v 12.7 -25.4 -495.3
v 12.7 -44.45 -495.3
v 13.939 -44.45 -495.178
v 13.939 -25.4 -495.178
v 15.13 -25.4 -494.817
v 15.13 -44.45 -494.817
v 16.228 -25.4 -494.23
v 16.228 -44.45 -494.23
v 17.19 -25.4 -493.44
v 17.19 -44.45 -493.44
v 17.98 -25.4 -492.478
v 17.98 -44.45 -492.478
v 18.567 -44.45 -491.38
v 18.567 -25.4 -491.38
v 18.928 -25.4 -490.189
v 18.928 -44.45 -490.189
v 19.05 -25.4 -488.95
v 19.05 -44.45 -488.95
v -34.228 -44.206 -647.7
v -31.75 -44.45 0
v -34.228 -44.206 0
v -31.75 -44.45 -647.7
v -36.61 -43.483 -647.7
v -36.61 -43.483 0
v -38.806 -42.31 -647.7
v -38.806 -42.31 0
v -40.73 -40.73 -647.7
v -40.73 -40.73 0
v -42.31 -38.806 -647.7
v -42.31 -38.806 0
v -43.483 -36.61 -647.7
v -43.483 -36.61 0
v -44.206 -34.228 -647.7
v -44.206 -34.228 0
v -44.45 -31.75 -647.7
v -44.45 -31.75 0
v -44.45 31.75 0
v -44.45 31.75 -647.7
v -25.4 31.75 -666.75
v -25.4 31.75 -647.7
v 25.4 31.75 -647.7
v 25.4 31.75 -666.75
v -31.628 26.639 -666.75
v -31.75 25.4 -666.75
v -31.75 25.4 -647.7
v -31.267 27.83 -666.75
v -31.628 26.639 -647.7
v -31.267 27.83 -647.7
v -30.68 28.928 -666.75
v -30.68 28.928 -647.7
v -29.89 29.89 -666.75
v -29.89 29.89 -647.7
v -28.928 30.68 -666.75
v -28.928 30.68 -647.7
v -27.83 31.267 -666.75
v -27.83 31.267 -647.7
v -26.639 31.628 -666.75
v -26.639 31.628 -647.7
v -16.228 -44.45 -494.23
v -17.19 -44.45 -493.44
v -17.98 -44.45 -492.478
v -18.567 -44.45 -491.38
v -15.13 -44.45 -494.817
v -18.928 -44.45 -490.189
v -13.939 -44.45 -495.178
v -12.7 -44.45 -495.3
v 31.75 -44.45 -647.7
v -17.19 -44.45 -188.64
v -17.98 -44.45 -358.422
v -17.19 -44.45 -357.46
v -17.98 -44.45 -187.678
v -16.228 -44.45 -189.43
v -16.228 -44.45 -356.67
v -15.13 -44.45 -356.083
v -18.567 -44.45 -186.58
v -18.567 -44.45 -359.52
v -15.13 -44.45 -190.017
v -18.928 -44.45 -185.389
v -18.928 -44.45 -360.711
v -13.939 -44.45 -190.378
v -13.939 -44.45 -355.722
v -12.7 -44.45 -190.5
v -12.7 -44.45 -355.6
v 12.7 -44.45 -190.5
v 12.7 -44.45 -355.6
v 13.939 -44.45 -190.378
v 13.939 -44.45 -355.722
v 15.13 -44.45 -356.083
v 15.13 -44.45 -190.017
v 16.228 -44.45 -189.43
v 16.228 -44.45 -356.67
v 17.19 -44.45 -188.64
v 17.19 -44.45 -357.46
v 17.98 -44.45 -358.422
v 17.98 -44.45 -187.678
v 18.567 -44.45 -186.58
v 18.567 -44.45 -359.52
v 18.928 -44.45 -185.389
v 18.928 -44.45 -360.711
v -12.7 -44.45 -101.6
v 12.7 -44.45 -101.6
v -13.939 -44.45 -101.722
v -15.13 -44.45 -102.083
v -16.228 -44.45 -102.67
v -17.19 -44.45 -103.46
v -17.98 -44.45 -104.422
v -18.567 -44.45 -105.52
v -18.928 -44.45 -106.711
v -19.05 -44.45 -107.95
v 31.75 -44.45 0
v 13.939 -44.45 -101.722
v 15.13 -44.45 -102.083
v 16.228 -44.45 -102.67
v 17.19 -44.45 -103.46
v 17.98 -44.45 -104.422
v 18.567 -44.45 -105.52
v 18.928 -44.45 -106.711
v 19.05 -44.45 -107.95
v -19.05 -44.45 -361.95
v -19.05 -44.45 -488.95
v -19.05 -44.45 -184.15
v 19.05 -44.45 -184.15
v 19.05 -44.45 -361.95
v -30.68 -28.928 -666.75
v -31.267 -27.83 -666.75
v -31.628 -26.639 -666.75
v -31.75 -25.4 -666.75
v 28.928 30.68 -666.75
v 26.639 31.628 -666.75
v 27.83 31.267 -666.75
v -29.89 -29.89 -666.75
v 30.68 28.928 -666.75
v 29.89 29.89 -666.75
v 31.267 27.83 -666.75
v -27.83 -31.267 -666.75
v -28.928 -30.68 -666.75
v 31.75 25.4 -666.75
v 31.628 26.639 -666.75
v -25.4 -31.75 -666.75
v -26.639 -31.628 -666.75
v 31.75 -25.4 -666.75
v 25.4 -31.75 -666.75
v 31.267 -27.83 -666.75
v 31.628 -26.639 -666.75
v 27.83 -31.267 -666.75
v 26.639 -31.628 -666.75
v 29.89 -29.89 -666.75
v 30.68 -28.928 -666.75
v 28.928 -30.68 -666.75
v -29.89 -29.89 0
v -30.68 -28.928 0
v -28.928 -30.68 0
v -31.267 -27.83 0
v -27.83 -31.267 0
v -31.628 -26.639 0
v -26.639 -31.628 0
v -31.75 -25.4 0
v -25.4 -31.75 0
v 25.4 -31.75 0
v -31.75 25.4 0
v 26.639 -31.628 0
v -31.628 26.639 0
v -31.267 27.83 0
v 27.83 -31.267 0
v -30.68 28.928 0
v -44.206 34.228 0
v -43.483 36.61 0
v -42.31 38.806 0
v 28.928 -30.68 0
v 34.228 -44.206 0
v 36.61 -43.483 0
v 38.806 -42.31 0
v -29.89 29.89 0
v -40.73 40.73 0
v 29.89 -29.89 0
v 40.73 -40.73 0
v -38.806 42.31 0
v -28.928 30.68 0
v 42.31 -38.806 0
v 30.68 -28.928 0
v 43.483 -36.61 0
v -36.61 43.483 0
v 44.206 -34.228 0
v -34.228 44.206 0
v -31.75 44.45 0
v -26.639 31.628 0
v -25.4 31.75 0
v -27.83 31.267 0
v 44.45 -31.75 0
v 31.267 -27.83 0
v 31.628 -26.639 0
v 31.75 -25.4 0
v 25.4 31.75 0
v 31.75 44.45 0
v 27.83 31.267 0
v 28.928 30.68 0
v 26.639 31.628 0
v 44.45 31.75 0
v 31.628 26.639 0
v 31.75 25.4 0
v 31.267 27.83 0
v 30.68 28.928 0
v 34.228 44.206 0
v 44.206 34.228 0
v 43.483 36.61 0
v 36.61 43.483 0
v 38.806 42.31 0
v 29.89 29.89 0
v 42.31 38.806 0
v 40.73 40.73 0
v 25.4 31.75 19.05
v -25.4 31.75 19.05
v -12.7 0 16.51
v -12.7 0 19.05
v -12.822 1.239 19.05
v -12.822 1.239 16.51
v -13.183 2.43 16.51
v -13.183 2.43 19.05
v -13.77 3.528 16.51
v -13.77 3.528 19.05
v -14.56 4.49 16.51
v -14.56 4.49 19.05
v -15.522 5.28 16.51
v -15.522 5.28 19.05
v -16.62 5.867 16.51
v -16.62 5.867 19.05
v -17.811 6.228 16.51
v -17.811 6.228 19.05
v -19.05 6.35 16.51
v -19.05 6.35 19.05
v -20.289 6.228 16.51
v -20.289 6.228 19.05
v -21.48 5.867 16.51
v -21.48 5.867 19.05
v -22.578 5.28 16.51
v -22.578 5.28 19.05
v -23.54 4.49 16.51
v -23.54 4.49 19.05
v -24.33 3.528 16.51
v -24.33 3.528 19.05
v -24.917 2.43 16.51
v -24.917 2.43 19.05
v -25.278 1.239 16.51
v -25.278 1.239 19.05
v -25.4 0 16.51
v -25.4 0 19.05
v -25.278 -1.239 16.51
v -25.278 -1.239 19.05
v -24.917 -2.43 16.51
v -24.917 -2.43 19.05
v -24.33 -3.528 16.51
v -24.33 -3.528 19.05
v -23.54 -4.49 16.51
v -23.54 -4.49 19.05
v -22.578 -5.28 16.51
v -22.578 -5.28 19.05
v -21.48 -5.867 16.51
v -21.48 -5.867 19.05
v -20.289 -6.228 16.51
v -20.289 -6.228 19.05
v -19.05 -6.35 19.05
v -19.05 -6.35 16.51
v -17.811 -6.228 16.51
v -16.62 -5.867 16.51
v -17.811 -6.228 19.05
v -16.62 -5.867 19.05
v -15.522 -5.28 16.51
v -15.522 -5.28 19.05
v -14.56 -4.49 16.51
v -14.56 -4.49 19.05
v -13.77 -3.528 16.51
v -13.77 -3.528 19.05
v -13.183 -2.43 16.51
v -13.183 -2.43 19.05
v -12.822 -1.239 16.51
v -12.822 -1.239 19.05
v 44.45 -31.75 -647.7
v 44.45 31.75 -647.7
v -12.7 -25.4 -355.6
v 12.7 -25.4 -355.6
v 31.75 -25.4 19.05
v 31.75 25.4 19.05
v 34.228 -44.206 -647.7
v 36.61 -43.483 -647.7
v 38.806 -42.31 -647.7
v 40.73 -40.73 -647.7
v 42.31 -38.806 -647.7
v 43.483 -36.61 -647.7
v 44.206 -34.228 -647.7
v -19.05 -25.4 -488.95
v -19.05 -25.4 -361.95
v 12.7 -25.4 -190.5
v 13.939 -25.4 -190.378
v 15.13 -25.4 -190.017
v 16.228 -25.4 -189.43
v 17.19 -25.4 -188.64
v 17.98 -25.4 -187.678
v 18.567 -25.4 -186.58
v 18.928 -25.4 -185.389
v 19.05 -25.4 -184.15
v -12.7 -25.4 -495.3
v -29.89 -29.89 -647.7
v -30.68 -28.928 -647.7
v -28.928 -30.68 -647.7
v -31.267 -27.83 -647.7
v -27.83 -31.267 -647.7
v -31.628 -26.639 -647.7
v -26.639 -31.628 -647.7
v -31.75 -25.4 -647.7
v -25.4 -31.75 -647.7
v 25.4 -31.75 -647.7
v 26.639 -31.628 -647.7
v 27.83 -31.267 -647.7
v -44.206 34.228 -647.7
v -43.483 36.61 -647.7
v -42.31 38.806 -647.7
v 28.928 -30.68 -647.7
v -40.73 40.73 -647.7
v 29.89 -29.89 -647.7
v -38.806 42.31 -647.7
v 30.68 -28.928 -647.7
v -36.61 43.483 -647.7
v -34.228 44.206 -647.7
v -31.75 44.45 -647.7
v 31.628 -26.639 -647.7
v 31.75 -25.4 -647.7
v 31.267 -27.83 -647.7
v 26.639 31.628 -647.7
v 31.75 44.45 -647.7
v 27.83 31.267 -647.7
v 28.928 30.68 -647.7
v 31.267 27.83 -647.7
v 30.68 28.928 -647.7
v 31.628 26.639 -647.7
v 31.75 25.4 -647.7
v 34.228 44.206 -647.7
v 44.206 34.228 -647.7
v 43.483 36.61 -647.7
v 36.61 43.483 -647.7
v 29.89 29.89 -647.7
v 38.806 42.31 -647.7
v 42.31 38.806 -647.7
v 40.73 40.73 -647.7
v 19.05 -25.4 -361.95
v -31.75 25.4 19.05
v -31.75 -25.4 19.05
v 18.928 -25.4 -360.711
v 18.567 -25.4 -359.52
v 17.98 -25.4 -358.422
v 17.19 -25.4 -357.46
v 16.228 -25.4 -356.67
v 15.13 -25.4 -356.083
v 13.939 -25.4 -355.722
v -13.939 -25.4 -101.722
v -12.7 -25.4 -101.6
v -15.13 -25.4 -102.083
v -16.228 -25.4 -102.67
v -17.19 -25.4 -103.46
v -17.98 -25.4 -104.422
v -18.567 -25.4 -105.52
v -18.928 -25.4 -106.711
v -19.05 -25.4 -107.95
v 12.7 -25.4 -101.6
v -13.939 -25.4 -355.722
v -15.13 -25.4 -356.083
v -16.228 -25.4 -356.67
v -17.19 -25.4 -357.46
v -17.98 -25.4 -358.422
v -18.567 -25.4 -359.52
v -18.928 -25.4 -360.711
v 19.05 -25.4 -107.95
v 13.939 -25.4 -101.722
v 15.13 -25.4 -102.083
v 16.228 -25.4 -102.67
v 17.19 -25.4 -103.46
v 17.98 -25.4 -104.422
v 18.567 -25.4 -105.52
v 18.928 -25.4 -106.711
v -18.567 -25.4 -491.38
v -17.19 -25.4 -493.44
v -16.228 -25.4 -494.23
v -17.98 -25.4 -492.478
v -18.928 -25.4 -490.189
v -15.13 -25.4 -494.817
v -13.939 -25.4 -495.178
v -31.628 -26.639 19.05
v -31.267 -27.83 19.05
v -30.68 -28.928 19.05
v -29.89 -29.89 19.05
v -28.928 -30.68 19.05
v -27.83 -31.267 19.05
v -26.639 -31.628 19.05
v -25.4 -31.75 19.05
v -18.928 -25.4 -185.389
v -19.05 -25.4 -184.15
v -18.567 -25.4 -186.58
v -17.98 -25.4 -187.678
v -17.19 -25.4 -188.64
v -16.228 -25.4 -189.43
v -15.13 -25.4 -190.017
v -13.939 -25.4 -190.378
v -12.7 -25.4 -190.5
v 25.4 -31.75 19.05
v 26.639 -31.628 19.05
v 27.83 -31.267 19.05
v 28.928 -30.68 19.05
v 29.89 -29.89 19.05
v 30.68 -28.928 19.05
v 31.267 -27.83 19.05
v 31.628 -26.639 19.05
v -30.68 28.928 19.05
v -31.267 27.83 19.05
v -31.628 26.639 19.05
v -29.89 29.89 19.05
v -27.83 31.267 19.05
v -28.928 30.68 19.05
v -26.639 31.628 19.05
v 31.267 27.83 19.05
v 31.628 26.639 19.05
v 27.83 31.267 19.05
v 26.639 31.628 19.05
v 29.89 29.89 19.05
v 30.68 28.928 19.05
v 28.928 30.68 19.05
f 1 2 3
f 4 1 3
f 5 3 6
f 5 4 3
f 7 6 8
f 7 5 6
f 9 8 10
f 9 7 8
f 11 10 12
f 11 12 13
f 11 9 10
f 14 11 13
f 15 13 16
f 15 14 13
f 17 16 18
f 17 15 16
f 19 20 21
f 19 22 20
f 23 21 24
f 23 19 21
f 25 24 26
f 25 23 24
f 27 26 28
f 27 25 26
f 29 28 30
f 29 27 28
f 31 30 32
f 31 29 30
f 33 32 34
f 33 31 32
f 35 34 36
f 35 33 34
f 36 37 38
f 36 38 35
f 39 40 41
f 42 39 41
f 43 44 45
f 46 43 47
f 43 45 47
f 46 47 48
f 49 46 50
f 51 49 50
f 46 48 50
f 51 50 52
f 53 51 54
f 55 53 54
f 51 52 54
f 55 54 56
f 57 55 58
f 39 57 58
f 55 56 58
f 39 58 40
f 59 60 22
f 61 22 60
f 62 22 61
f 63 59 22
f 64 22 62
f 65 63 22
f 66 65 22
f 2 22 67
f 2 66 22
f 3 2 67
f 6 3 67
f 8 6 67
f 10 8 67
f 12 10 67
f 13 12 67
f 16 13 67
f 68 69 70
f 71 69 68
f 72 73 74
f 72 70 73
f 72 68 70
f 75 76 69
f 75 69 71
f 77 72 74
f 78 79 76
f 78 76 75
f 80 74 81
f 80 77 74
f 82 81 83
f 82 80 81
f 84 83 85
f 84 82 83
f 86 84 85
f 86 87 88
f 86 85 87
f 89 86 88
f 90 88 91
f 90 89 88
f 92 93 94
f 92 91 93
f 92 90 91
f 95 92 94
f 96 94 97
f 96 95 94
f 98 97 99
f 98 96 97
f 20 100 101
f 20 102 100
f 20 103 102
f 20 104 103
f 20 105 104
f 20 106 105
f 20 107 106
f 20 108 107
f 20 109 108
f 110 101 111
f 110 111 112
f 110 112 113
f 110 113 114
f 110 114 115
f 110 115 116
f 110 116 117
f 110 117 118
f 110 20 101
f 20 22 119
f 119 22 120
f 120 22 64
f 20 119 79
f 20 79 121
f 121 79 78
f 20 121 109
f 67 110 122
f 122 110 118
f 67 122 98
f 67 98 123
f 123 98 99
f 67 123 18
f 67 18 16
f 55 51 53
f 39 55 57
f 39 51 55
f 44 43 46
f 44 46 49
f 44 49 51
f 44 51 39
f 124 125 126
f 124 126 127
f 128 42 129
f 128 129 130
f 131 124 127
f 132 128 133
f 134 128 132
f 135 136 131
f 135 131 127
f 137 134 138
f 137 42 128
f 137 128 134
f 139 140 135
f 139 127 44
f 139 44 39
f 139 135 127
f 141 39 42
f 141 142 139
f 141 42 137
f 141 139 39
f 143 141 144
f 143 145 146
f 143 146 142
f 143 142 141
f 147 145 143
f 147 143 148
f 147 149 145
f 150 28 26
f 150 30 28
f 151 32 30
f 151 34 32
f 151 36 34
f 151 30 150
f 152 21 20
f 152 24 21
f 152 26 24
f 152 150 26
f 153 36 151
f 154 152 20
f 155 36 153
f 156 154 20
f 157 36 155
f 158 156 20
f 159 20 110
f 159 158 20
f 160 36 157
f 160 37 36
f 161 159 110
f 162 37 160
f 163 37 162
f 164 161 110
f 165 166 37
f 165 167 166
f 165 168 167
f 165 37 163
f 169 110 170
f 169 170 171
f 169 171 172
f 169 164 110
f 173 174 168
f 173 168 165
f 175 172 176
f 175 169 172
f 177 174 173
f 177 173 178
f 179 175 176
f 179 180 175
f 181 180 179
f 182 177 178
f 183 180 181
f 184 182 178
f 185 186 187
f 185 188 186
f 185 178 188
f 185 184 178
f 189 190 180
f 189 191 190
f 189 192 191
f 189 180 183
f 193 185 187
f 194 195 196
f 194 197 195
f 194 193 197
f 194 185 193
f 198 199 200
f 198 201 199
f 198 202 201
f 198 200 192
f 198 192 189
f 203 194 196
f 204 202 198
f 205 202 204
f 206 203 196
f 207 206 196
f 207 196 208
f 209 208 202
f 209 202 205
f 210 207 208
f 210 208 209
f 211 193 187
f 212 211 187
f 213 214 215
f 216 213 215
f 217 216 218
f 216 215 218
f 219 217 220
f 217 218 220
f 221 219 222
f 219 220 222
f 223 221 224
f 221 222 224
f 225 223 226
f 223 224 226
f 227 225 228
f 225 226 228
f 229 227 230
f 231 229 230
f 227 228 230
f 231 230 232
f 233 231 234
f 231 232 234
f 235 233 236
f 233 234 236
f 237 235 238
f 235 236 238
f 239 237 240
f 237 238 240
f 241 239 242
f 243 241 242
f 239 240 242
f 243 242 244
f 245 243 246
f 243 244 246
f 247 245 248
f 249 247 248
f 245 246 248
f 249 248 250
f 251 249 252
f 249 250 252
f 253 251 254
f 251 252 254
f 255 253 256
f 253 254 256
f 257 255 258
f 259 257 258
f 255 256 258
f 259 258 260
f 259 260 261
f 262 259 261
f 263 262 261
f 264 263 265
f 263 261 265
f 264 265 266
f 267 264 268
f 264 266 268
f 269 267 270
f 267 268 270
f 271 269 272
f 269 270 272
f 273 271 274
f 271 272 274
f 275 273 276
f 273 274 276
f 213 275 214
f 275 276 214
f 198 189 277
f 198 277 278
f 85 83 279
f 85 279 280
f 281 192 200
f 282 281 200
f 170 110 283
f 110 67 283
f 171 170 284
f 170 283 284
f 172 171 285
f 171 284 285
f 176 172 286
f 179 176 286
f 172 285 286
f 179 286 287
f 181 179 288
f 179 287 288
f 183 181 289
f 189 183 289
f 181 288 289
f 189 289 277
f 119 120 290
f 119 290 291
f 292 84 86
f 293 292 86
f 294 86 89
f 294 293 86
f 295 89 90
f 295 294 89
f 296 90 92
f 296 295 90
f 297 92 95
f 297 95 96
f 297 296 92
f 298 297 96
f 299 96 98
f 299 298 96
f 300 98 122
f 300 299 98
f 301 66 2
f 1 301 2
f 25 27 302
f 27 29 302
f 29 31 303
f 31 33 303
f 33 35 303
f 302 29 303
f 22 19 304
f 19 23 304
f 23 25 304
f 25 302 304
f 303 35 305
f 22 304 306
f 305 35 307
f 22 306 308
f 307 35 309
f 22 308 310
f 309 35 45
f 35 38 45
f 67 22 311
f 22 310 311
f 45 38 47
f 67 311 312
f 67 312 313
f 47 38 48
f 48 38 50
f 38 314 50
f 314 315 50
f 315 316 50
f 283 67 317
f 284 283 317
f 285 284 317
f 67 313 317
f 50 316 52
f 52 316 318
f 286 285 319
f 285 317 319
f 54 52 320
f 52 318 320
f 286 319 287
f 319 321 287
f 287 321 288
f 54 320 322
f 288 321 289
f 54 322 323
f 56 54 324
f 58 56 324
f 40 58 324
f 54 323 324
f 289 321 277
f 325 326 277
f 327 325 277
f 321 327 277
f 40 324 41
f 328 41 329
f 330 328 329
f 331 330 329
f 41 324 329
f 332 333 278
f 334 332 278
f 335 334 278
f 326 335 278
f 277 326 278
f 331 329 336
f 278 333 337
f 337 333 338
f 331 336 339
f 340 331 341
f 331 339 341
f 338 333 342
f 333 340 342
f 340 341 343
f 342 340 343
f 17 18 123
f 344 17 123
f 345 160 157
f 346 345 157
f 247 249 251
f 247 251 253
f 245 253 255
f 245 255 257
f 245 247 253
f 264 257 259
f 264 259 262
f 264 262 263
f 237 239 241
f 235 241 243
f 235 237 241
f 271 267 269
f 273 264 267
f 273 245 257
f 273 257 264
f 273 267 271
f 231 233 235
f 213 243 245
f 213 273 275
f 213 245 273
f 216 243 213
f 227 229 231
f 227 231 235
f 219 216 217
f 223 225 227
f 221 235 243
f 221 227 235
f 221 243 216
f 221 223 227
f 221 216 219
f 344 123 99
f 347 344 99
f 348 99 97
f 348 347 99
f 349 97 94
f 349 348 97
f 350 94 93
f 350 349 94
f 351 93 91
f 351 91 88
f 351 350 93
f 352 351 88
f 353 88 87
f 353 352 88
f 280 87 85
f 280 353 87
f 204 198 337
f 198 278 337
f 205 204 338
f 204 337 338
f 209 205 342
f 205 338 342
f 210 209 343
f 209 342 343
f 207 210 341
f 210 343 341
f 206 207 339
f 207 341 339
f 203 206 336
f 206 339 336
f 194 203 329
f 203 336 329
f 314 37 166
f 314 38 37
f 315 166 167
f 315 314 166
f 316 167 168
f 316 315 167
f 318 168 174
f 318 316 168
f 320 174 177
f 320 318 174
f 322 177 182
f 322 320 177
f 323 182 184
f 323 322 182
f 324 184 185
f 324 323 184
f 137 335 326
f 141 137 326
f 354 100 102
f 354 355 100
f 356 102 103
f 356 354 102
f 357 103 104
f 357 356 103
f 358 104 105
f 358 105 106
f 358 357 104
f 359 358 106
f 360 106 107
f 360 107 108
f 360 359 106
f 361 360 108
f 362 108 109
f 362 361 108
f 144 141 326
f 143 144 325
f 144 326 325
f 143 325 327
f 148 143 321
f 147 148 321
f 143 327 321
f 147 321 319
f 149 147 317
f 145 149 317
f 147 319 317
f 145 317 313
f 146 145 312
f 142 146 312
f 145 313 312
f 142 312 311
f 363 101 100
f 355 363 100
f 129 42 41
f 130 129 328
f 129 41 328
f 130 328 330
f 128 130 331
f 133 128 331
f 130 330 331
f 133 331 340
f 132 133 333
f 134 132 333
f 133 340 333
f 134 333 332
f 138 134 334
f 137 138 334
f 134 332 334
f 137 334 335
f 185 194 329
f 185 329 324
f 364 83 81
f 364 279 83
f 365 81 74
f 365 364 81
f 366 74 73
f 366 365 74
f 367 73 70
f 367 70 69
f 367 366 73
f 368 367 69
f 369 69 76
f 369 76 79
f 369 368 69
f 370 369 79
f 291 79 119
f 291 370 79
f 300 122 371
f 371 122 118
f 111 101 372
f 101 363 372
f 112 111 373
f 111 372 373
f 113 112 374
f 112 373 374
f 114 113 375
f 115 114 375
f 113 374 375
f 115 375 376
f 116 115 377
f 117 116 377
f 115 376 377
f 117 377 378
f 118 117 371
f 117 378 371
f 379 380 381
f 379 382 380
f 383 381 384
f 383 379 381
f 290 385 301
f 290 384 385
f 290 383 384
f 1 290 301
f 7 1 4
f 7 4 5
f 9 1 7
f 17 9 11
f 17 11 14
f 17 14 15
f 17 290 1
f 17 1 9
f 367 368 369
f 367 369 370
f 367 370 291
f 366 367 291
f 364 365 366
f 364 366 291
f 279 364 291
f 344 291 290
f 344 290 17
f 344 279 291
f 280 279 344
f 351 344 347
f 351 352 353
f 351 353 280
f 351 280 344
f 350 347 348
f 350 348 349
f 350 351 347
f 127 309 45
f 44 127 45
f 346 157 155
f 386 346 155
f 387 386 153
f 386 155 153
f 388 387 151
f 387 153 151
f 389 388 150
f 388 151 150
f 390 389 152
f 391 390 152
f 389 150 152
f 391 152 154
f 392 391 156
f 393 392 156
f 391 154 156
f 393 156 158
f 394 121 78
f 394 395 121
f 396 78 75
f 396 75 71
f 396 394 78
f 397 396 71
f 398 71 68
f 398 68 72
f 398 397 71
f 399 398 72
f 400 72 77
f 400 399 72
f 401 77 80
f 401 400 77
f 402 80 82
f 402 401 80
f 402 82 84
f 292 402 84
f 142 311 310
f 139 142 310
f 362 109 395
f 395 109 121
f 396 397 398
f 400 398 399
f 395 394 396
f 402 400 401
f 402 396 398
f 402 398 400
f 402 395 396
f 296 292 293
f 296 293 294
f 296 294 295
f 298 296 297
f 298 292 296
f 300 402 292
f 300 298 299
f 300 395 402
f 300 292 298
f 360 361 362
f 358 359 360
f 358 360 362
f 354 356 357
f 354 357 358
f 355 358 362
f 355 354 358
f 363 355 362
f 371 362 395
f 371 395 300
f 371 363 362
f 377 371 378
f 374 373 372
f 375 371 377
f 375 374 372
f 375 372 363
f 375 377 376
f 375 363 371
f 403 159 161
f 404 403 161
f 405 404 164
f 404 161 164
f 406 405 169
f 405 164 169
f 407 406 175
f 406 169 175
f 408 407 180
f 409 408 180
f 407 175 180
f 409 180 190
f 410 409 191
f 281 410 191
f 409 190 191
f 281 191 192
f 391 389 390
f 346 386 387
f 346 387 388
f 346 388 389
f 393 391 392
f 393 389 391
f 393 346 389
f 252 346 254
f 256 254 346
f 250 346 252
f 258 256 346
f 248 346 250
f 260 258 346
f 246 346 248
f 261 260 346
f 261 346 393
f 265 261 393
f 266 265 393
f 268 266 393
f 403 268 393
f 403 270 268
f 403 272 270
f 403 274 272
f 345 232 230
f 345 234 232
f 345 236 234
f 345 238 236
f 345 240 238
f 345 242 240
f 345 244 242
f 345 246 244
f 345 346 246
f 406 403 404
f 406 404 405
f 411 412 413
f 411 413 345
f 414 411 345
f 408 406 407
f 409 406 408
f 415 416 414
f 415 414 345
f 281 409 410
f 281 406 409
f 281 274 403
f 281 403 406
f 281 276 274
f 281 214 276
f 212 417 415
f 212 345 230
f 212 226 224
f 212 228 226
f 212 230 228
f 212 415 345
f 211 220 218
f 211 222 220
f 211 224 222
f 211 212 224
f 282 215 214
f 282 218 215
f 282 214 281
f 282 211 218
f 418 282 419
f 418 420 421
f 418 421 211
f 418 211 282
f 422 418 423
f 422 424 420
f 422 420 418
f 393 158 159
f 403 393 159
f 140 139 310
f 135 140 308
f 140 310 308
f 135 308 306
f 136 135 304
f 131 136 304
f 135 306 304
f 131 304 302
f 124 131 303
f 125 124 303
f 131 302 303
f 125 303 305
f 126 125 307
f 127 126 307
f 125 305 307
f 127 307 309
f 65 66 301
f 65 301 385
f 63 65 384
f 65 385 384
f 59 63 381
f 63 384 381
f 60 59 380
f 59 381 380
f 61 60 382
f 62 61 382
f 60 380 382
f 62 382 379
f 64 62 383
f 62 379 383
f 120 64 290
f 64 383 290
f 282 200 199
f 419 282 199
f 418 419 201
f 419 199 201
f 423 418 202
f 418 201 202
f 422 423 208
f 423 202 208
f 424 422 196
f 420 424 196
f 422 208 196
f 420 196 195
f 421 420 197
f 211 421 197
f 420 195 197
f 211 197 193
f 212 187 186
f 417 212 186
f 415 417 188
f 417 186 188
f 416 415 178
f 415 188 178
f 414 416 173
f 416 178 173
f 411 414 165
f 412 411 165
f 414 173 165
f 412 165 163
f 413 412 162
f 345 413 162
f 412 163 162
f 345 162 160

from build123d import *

# Parameters (mm, degrees)
F2_DEPTH  = 647.7
F4_DEPTH  = 19.05
F5_R      = 12.7
F6_R      = 6.35
F7_W      = 38.1
F7_H      = 139.7
F8_DEPTH  = 19.05
F9_R      = 6.35
F11_DEPTH = 19.05
F13_DEPTH = 19.05
F14_R     = 6.35
F15_DEPTH = 2.54


with BuildPart() as f2:
    # F1 (on Top) → F2 (new body)
    with BuildSketch(Plane.XY):
        Polygon((-44.45, 19.05), (-44.45, 0), (-44.45, -19.05), (-44.45, -44.45), (-19.05, -44.45), (0, -44.45), (19.05, -44.45), (44.45, -44.45), (44.45, -19.05), (44.45, 0), (44.45, 19.05), (44.45, 44.45), (19.05, 44.45), (0, 44.45), (-19.05, 44.45), (-44.45, 44.45), align=None)
    extrude(amount=-F2_DEPTH)

    # F3 (on face) → F4 (cut)
    with BuildSketch(Plane.XZ.offset(44.45)):
        Polygon((19.05, -101.6), (-19.05, -101.6), (-19.05, -190.5), (0, -190.5), (19.05, -190.5), align=None)
    extrude(amount=-F4_DEPTH, mode=Mode.SUBTRACT)

    # F5
    f5_edges = [f2.edges().sort_by_distance(p)[0] for p in [
        (-44.45, -44.45, -323.85),
        (44.45, -44.45, -323.85),
        (44.45, 44.45, -323.85),
        (-44.45, 44.45, -323.85),
    ]]
    fillet(f5_edges, radius=F5_R)

    # F6
    f6_edges = [f2.edges().sort_by_distance(p)[0] for p in [
        (-19.05, -34.925, -190.5),
        (19.05, -34.925, -190.5),
        (-19.05, -34.925, -101.6),
        (19.05, -34.925, -101.6),
    ]]
    fillet(f6_edges, radius=F6_R)

    # F7 (on face) → F8 (cut)
    with BuildSketch(Plane.XZ.offset(44.45)):
        with Locations((0, -425.45)):
            Rectangle(F7_W, F7_H)
    extrude(amount=-F8_DEPTH, mode=Mode.SUBTRACT)

    # F9
    f9_edges = [f2.edges().sort_by_distance(p)[0] for p in [
        (-19.05, -34.925, -355.6),
        (19.05, -34.925, -355.6),
        (19.05, -34.925, -495.3),
        (-19.05, -34.925, -495.3),
    ]]
    fillet(f9_edges, radius=F9_R)

    # F10 (on face) → F11 (join)
    with BuildSketch(Plane.XY):
        with BuildLine():
            Line((-25.4, -31.75), (25.4, -31.75))
            ThreePointArc((25.4, -31.75), (29.8901280605, -29.8901280605), (31.75, -25.4))
            Line((31.75, -25.4), (31.75, 25.4))
            ThreePointArc((31.75, 25.4), (29.8901280605, 29.8901280605), (25.4, 31.75))
            Line((25.4, 31.75), (-25.4, 31.75))
            ThreePointArc((-25.4, 31.75), (-29.8901280605, 29.8901280605), (-31.75, 25.4))
            Line((-31.75, 25.4), (-31.75, -25.4))
            ThreePointArc((-31.75, -25.4), (-29.8901280605, -29.8901280605), (-25.4, -31.75))
        make_face()
    extrude(amount=F11_DEPTH)

    # F12 (on face) → F13 (join)
    with BuildSketch(Plane(origin=(0, 0, -647.7), x_dir=(1, 0, 0), z_dir=(0, 0, -1))):
        with BuildLine():
            Line((-25.4, -31.75), (25.4, -31.75))
            ThreePointArc((25.4, -31.75), (29.8901280605, -29.8901280605), (31.75, -25.4))
            Line((31.75, -25.4), (31.75, 25.4))
            ThreePointArc((31.75, 25.4), (29.8901280605, 29.8901280605), (25.4, 31.75))
            Line((25.4, 31.75), (-25.4, 31.75))
            ThreePointArc((-25.4, 31.75), (-29.8901280605, 29.8901280605), (-31.75, 25.4))
            Line((-31.75, 25.4), (-31.75, -25.4))
            ThreePointArc((-31.75, -25.4), (-29.8901280605, -29.8901280605), (-25.4, -31.75))
        make_face()
    extrude(amount=F13_DEPTH)

    # F14 (on face) → F15 (cut)
    with BuildSketch(Plane.XY.offset(19.05)):
        with Locations((-19.05, 0)):
            Circle(F14_R)
    extrude(amount=-F15_DEPTH, mode=Mode.SUBTRACT)


solid = f2.part
